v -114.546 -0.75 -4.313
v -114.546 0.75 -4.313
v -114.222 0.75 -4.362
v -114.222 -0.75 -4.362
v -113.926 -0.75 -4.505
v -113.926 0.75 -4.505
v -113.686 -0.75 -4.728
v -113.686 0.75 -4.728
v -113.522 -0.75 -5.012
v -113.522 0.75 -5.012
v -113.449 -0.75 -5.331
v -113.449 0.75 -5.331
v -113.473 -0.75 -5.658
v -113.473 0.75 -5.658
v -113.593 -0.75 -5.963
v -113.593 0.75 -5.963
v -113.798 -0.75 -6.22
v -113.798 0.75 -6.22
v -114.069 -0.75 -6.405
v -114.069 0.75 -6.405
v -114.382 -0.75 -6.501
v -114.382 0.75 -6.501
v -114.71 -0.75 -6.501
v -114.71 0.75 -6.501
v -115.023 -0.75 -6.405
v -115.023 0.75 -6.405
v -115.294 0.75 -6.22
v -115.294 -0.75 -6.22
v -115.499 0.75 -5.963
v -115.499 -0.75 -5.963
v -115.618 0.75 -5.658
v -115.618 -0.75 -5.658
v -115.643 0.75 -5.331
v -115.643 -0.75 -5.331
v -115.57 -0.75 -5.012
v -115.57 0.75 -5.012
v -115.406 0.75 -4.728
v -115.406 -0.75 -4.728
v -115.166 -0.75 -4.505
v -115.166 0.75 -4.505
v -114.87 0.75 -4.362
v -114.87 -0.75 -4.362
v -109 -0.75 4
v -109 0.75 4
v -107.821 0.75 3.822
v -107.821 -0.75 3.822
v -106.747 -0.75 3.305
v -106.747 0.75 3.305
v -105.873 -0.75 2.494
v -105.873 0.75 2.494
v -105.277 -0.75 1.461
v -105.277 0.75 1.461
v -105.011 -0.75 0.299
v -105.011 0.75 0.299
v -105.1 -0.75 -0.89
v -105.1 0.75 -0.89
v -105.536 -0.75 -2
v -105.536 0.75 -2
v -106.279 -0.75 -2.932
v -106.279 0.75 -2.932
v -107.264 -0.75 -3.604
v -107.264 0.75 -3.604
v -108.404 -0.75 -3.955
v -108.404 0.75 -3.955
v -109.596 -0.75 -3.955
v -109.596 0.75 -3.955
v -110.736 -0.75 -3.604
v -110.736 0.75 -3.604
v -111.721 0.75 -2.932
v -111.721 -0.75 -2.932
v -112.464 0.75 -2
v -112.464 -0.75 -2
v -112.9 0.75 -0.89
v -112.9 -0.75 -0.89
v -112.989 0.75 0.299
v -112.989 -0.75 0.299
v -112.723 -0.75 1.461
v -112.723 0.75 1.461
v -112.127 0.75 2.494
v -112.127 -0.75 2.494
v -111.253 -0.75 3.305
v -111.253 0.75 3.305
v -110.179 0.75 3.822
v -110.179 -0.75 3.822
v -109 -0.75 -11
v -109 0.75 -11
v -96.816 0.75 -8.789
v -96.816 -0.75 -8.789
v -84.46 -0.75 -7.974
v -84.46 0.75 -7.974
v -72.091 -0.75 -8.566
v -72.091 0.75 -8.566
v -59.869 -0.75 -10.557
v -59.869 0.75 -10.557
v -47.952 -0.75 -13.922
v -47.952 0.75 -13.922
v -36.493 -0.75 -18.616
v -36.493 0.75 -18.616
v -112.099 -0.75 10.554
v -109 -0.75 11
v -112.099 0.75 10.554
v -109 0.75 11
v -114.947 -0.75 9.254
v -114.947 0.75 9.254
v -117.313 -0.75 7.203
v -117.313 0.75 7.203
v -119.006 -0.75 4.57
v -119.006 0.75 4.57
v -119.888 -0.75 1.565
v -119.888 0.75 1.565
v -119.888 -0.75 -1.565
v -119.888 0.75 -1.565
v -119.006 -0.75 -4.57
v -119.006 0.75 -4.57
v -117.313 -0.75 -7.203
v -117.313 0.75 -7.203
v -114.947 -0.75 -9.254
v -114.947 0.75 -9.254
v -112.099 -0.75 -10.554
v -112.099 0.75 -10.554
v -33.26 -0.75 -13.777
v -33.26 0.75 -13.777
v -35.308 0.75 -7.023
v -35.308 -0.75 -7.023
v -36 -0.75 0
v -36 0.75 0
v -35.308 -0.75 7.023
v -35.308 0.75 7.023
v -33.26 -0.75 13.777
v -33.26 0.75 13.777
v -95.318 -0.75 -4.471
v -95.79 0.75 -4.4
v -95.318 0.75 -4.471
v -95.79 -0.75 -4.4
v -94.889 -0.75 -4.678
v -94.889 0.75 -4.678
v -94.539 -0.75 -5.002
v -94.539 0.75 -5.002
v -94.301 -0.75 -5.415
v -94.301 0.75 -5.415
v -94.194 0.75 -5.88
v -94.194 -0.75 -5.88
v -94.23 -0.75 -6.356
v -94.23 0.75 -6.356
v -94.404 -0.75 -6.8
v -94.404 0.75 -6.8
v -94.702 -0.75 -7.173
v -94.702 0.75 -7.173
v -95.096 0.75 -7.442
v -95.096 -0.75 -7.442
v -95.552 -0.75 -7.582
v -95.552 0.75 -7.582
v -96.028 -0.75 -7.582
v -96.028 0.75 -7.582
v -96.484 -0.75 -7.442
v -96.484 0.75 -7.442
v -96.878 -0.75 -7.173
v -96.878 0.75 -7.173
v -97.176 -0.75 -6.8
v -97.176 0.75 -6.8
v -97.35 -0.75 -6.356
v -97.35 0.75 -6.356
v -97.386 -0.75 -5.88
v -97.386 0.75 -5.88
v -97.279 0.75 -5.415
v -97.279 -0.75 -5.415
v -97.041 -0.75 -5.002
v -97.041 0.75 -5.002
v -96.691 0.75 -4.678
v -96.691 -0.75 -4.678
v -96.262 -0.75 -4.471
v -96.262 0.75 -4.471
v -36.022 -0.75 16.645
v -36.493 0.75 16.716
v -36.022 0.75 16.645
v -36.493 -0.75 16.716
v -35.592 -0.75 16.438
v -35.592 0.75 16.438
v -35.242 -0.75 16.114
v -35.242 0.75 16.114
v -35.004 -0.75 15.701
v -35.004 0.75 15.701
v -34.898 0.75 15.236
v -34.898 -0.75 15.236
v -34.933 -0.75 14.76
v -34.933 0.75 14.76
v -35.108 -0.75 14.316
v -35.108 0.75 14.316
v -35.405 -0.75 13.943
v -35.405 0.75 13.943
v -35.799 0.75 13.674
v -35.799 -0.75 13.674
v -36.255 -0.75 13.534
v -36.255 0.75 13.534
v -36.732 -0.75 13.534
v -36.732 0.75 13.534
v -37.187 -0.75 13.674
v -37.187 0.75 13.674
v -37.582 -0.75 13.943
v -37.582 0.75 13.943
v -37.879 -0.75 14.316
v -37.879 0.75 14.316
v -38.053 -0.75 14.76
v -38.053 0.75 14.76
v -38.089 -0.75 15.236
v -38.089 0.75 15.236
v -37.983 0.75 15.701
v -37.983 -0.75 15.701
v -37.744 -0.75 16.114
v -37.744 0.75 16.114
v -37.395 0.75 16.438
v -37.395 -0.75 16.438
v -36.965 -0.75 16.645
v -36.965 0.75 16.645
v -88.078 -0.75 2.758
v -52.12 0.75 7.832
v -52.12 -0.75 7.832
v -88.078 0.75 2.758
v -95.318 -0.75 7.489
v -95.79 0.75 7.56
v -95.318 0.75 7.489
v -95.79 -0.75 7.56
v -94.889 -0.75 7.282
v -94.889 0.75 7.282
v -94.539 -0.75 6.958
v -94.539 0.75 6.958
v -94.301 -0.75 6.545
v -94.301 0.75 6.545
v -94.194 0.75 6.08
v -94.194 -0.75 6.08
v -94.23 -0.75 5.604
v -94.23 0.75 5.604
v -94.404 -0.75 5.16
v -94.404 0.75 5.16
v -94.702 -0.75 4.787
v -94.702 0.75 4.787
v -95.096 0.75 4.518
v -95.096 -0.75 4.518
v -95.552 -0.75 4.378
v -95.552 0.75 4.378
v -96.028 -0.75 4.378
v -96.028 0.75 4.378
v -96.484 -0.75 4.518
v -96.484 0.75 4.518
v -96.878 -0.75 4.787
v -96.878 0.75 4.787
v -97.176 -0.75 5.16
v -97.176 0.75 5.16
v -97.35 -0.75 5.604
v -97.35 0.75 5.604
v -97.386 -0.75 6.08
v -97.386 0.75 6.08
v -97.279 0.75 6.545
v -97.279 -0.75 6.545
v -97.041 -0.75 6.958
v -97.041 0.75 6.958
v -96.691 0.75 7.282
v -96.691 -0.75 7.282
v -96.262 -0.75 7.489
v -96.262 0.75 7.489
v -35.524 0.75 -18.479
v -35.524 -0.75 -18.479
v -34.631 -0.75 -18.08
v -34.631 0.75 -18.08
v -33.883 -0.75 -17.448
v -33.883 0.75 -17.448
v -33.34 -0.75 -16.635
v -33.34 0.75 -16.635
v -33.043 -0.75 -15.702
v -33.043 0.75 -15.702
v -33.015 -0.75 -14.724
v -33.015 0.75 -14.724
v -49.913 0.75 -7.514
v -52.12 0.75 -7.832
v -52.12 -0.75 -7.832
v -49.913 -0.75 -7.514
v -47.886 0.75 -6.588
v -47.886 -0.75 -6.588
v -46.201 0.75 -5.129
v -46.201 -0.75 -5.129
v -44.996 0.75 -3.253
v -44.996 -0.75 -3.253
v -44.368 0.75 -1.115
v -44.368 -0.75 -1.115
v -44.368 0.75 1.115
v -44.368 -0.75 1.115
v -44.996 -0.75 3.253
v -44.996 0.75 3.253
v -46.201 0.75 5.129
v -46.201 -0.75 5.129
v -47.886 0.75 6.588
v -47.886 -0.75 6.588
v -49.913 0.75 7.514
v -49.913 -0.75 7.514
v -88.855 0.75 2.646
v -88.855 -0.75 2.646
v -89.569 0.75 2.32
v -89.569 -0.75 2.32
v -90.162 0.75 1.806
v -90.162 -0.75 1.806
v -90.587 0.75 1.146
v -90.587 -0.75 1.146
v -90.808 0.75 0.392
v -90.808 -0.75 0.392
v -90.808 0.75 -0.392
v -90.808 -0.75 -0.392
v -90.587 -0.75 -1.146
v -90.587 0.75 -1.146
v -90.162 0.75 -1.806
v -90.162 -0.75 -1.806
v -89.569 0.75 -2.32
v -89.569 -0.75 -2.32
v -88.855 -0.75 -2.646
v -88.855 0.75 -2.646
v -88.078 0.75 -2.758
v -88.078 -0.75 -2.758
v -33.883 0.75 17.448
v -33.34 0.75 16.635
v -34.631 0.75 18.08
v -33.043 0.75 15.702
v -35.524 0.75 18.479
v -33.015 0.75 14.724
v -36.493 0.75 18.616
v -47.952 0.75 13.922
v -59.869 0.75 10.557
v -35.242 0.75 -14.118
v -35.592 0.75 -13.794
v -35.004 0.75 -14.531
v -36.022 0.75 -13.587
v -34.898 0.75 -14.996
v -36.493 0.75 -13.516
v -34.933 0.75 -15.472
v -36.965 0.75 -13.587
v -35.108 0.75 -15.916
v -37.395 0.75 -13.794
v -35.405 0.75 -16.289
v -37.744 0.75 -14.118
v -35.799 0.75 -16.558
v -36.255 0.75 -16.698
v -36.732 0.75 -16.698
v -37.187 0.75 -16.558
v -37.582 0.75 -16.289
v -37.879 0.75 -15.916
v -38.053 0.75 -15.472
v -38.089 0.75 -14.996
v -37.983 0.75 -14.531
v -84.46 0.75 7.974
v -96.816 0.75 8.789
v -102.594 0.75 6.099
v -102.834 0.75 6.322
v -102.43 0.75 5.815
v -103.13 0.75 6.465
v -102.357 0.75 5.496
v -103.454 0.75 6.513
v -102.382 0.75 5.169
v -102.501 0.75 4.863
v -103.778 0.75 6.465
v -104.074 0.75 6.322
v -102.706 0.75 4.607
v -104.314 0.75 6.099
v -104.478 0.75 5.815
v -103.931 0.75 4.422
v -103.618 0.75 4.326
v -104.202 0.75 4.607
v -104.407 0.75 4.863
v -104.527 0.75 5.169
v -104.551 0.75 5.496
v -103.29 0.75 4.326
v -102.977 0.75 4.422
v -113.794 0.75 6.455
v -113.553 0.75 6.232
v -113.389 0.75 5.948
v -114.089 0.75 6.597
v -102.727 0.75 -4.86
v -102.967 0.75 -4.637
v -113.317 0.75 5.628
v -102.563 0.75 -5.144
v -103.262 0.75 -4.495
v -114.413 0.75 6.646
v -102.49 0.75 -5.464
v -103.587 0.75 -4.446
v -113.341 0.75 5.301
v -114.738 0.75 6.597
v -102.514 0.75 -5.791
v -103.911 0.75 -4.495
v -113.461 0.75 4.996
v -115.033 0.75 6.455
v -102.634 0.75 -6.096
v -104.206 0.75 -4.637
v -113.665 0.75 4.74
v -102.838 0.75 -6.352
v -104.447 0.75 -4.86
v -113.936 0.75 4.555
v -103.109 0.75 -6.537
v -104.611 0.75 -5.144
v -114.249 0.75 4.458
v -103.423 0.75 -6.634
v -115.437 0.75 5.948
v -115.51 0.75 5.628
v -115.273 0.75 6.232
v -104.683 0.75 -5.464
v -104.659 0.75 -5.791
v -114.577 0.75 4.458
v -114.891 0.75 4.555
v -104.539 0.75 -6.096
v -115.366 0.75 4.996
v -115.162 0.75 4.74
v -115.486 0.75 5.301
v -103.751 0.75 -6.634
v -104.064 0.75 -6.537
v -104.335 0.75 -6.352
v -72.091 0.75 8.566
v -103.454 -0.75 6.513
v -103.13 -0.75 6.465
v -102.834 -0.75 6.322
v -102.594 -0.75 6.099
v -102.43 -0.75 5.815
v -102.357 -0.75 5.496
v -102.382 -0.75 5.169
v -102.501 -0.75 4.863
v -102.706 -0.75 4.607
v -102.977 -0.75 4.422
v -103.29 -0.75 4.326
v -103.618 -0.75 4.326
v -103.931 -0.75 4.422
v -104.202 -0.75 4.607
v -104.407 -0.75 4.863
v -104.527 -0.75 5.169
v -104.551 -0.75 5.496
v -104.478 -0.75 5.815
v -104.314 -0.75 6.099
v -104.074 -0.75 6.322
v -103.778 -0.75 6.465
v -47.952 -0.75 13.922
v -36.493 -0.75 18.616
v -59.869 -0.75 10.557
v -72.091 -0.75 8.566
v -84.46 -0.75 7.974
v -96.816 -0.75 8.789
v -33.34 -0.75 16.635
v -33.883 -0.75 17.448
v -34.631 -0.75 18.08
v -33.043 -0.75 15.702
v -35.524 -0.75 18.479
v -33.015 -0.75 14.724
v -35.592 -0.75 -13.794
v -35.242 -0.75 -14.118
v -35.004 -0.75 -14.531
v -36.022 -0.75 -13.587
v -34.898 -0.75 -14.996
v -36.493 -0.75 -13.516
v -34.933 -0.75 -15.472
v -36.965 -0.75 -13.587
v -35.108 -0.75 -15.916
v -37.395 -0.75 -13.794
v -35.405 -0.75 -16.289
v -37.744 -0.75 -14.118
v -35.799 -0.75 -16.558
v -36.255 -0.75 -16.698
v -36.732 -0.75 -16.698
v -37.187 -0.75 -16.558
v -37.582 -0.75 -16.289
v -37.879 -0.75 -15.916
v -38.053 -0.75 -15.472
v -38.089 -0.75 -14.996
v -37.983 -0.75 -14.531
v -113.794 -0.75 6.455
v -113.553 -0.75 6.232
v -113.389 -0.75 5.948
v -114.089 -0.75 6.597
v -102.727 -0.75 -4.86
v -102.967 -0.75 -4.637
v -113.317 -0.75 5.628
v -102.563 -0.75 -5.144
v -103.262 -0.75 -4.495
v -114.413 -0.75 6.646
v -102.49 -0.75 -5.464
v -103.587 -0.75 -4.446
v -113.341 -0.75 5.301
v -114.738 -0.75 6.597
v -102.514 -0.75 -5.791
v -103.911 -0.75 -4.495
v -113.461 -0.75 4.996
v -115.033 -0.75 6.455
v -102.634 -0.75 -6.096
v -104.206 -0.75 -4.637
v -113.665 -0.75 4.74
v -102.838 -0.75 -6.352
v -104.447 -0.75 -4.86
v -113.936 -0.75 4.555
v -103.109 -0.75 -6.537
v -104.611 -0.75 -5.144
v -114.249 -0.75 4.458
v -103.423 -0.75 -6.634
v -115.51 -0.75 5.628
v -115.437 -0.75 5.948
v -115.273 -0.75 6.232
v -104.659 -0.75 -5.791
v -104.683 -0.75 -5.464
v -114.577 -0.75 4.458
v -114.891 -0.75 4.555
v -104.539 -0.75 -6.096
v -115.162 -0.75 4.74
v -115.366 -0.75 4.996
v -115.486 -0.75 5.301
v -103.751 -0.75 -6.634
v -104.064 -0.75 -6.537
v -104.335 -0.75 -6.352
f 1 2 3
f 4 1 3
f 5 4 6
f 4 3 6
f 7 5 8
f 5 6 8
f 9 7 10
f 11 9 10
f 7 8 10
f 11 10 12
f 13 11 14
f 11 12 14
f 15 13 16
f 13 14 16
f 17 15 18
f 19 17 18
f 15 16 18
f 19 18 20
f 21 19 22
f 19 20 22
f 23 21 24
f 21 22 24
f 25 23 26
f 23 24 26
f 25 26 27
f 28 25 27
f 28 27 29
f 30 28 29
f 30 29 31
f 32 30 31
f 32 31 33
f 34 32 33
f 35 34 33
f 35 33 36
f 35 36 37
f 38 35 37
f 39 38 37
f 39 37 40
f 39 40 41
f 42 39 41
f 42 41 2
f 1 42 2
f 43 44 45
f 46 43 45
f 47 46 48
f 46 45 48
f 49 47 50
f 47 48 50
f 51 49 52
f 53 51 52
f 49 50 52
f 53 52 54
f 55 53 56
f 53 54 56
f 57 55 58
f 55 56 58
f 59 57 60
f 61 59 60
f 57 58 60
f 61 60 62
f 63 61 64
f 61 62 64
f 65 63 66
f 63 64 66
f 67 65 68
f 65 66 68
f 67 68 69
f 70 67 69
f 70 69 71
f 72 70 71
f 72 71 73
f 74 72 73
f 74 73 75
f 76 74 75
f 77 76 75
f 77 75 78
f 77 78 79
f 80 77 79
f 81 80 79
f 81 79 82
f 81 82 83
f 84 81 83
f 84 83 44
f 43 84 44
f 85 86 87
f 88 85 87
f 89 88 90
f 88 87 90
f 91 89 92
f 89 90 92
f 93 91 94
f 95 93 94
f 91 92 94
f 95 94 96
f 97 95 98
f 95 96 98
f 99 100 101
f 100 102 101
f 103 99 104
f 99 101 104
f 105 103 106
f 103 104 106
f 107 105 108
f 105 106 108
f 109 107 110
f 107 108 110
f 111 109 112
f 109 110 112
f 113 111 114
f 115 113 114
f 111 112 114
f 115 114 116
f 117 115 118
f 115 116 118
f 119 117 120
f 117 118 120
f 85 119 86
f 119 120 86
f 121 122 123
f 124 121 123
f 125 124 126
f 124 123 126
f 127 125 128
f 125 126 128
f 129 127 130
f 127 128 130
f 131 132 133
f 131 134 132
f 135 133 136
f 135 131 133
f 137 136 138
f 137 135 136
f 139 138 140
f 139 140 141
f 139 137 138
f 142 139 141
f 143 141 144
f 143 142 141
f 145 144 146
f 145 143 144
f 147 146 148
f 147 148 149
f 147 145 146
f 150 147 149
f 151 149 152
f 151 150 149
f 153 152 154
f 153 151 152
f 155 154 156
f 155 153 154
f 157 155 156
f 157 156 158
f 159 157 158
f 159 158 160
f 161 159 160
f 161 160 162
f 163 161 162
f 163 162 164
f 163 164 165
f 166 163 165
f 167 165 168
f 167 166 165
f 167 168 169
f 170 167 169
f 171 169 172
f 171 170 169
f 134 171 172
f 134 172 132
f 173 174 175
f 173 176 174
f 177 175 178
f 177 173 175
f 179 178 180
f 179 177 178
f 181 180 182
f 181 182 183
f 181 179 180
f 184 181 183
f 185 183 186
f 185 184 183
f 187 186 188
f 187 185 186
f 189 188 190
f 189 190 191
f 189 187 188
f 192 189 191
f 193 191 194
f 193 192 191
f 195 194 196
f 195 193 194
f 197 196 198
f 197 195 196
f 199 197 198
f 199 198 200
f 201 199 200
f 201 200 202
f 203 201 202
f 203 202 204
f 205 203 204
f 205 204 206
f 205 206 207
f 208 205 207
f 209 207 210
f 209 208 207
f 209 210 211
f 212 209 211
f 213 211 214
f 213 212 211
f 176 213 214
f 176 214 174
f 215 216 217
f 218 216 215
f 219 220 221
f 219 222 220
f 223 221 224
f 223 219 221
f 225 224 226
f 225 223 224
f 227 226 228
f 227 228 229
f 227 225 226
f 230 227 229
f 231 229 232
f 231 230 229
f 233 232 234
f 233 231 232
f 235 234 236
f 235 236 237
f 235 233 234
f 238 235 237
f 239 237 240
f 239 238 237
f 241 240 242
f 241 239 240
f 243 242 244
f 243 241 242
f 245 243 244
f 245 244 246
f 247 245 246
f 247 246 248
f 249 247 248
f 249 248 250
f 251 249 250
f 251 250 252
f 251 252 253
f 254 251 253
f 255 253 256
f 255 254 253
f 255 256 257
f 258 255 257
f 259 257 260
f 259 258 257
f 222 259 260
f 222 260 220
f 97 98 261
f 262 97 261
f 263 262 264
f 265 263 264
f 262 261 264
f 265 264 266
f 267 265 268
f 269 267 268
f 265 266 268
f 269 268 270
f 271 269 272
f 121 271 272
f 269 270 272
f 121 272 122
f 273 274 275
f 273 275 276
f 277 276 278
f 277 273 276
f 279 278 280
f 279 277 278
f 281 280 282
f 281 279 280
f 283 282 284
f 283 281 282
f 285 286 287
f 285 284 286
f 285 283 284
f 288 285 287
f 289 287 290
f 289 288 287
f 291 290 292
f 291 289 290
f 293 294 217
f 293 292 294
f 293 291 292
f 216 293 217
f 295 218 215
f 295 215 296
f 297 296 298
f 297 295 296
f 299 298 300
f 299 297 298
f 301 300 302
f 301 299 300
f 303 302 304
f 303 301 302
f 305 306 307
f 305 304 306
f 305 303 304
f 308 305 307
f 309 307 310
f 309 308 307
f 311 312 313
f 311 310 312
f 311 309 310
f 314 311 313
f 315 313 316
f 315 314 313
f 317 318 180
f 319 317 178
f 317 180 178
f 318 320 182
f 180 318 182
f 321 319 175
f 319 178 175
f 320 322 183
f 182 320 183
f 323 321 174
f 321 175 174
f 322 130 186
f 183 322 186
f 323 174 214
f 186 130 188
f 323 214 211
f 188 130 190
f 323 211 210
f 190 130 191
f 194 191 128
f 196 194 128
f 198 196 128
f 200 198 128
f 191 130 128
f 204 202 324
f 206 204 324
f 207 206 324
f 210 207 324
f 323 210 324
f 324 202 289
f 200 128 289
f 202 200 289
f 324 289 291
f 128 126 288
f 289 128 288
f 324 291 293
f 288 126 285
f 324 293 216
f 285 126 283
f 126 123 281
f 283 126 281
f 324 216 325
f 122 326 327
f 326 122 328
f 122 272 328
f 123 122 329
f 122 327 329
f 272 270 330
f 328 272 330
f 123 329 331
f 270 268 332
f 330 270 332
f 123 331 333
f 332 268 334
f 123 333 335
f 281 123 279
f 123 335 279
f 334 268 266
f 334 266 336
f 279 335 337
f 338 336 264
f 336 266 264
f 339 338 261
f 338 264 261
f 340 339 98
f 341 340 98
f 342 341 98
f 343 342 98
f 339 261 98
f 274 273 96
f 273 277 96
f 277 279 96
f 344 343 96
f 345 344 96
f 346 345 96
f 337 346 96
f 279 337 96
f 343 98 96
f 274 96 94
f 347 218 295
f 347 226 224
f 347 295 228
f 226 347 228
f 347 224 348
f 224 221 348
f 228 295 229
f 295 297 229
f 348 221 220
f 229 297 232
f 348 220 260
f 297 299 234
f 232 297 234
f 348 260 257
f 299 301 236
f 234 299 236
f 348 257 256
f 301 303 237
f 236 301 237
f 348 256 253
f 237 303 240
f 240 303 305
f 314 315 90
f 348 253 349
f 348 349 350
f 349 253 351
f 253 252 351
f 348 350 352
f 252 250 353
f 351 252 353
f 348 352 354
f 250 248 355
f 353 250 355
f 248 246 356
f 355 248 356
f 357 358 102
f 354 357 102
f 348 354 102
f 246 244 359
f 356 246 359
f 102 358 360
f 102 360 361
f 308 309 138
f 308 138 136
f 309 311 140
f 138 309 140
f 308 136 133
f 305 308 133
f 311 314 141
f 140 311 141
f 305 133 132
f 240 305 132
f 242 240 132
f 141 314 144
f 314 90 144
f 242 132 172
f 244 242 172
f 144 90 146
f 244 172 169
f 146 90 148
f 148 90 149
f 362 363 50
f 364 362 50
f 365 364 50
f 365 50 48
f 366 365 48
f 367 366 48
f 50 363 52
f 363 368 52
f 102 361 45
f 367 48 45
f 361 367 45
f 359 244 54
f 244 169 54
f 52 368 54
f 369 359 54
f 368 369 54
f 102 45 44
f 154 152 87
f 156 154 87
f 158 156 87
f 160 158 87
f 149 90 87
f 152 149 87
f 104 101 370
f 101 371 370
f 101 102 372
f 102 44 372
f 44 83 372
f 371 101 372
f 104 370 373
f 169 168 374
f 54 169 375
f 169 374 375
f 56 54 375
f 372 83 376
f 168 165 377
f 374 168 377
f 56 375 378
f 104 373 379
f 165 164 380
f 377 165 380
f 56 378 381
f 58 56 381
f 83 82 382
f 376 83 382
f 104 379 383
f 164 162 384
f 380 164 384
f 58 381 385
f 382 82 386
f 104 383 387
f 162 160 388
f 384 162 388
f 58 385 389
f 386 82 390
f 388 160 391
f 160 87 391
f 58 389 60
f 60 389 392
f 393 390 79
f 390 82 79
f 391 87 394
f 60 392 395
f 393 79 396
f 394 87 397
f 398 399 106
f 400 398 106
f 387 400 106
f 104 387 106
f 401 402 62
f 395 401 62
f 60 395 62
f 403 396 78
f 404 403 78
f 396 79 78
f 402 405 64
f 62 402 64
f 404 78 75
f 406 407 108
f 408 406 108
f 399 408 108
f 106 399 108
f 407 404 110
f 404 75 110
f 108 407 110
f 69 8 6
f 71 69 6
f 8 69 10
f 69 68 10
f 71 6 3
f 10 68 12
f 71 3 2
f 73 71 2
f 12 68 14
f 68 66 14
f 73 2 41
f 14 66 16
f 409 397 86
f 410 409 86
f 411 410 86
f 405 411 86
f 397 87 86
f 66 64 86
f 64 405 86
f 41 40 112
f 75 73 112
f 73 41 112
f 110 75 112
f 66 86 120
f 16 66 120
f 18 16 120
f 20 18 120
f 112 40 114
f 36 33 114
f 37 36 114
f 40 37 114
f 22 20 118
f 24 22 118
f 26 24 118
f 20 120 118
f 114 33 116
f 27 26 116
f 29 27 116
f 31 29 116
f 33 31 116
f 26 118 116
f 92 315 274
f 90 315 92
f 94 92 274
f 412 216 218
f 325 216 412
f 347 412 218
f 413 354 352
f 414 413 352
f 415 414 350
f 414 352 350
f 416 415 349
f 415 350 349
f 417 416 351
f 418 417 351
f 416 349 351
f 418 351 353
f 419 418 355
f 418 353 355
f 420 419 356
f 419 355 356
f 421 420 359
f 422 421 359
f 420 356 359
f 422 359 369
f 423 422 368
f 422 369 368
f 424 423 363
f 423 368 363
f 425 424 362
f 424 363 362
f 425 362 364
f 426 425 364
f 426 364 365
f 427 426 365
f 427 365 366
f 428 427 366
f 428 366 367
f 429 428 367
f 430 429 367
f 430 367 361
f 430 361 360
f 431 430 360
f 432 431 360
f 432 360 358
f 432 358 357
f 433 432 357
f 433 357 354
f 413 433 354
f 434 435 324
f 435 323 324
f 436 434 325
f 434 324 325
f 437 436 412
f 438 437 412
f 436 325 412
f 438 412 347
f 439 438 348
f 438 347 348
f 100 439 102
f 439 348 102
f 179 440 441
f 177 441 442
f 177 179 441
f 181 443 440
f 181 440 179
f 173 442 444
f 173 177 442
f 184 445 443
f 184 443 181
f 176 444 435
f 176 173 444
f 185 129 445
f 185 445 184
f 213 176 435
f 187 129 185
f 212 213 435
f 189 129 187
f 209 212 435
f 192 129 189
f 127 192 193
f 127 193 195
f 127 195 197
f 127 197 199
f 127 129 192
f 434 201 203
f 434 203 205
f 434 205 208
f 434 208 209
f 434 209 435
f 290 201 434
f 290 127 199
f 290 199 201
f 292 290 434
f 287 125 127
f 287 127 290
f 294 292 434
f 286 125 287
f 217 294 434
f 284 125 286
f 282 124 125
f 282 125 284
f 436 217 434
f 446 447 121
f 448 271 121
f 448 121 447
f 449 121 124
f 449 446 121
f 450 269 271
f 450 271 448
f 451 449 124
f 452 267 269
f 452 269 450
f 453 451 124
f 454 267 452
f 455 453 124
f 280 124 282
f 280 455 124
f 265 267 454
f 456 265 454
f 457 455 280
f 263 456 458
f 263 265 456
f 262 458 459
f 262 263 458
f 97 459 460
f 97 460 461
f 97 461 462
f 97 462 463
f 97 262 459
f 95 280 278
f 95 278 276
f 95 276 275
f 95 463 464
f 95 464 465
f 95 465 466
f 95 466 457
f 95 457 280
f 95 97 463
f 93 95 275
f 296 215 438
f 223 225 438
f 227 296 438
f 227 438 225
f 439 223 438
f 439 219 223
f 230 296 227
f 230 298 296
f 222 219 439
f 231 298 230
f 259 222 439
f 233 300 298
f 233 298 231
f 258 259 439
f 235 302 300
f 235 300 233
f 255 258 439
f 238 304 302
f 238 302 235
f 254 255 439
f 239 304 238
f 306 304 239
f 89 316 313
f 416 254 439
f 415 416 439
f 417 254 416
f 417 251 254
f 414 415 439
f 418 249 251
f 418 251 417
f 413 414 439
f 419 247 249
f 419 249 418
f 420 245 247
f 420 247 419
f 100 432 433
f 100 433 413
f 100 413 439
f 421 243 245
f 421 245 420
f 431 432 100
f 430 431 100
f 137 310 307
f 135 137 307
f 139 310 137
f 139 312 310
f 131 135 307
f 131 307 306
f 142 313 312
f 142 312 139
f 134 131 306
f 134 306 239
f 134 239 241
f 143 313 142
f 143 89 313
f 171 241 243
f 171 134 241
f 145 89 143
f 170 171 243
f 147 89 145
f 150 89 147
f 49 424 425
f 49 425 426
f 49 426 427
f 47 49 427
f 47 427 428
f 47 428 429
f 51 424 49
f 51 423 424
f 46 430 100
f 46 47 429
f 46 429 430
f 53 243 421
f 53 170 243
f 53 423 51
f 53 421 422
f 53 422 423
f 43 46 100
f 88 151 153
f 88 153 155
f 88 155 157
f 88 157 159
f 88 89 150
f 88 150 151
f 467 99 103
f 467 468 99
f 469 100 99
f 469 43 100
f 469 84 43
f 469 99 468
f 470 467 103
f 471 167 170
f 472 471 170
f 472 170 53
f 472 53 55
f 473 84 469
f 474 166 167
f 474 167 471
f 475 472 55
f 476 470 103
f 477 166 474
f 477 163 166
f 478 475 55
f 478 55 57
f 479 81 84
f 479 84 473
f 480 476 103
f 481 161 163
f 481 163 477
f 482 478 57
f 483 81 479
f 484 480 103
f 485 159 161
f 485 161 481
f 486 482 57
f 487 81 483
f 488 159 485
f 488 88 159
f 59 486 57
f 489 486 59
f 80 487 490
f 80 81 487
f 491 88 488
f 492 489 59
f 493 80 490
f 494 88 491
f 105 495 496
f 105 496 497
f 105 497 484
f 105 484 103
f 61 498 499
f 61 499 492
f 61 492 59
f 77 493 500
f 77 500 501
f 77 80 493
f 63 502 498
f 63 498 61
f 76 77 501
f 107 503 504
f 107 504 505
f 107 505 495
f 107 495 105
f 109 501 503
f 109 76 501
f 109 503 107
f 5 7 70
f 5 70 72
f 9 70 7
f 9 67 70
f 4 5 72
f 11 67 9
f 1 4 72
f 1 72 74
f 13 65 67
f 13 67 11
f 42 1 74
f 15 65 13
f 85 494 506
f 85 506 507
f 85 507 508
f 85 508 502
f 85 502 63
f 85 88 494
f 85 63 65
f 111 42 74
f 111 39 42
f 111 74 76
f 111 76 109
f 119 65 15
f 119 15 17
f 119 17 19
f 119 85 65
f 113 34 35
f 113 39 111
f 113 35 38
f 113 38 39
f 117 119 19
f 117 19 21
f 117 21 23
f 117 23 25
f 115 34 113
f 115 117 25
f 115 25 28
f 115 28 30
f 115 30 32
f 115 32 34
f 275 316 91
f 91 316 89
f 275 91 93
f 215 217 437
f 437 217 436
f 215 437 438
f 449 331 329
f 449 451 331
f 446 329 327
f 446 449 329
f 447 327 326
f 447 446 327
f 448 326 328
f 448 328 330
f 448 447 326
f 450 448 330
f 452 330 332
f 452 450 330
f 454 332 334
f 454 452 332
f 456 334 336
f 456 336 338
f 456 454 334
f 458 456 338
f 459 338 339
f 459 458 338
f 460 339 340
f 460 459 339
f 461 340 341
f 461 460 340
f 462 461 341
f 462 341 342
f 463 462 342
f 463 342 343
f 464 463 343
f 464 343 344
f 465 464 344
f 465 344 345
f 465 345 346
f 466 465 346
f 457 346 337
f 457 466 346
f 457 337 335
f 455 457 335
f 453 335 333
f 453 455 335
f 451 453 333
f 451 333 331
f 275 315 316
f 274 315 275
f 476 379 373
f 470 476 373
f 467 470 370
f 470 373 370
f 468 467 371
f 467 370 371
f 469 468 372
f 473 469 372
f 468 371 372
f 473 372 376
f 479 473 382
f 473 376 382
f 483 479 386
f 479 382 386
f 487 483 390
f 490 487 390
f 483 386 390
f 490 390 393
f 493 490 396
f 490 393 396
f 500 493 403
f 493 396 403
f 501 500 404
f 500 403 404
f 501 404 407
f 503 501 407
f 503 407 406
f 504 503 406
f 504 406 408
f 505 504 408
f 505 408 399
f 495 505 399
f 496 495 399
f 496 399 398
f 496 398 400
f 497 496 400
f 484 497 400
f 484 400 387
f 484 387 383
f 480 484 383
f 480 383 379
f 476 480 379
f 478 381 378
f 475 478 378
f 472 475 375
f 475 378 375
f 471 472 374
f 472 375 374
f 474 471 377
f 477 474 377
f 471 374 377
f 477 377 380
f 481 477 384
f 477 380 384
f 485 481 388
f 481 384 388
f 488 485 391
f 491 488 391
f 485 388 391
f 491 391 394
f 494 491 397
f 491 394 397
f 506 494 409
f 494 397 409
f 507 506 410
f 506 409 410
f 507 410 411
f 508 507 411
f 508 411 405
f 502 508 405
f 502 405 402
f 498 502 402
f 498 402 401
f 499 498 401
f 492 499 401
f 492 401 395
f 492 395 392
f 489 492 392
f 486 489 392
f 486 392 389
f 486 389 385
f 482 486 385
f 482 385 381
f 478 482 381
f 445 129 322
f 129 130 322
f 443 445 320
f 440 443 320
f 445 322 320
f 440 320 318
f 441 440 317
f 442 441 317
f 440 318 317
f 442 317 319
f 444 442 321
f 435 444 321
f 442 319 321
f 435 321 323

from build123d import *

# Parameters (mm, degrees)
ESBO_O1_R                = 1.6
RESSALTO_EXTRUS_O1_DEPTH = 0.75
CORTE_EXTRUS_O1_REACH    = 123.445
ESBO_O2_R                = 4
ESBO_O2_R_2              = 1.1


with BuildPart() as part:
    # Esboço1 → Ressalto-extrusão1 (new, symmetric)
    with BuildSketch(Plane(origin=(0, 0, 0), x_dir=(1, 0, 0), z_dir=(0, 1, 0))):
        with BuildLine():
            ThreePointArc((-33.25966317, 13.776603565), (-36, 0), (-33.25966317, -13.776603565))
            ThreePointArc((-33.25966317, -13.776603565), (-33.583097891, -17.060491394), (-36.493241534, -18.615995578))
            ThreePointArc((-36.493241534, -18.615995578), (-72.090991916, -8.566197582), (-109, -11))
            ThreePointArc((-109, -11), (-120, 0), (-109, 11))
            ThreePointArc((-109, 11), (-72.090991916, 8.566197582), (-36.493241534, 18.615995578))
            ThreePointArc((-36.493241534, 18.615995578), (-33.583097891, 17.060491394), (-33.25966317, 13.776603565))
        make_face()
        with Locations(Location((-36.493241534, 15.115995578, 0), (0, 0, 270))):
            Circle(ESBO_O1_R, mode=Mode.SUBTRACT)
        with Locations(Location((-36.493241534, -15.115995578, 0), (0, 0, 270))):
            Circle(ESBO_O1_R, mode=Mode.SUBTRACT)
        with Locations(Location((-95.79, 6, 0), (0, 0, 270))):
            Circle(ESBO_O1_R, mode=Mode.SUBTRACT)
        with Locations(Location((-95.79, -5.96, 0), (0, 0, 270))):
            Circle(ESBO_O1_R, mode=Mode.SUBTRACT)
    extrude(amount=RESSALTO_EXTRUS_O1_DEPTH, both=True)

    # Esboço2 → Corte-extrusão1 (cut, up to next)
    with BuildSketch(Plane(origin=(0, 0.75, 0), x_dir=(1, 0, 0), z_dir=(0, 1, 0)), mode=Mode.PRIVATE) as corte_extrus_o1_sk1:
        with Locations(Location((-109, 0, 0), (0, 0, 270))):
            Circle(ESBO_O2_R)
    corte_extrus_o1_tool1 = extrude(corte_extrus_o1_sk1.sketch, amount=-CORTE_EXTRUS_O1_REACH, mode=Mode.PRIVATE) & part.part
    # Esboço2 → Corte-extrusão1 (cut, up to next)
    with BuildSketch(Plane(origin=(0, 0.75, 0), x_dir=(1, 0, 0), z_dir=(0, 1, 0)), mode=Mode.PRIVATE) as corte_extrus_o1_sk2:
        with Locations(Location((-103.586557067, 5.545911613, 0), (0, 0, 270))):
            Circle(ESBO_O2_R_2)
    corte_extrus_o1_tool2 = extrude(corte_extrus_o1_sk2.sketch, amount=-CORTE_EXTRUS_O1_REACH, mode=Mode.PRIVATE) & part.part
    # Esboço2 → Corte-extrusão1 (cut, up to next)
    with BuildSketch(Plane(origin=(0, 0.75, 0), x_dir=(1, 0, 0), z_dir=(0, 1, 0)), mode=Mode.PRIVATE) as corte_extrus_o1_sk3:
        with Locations(Location((-103.454088387, -5.413442933, 0), (0, 0, 270))):
            Circle(ESBO_O2_R_2)
    corte_extrus_o1_tool3 = extrude(corte_extrus_o1_sk3.sketch, amount=-CORTE_EXTRUS_O1_REACH, mode=Mode.PRIVATE) & part.part
    # Esboço2 → Corte-extrusão1 (cut, up to next)
    with BuildSketch(Plane(origin=(0, 0.75, 0), x_dir=(1, 0, 0), z_dir=(0, 1, 0)), mode=Mode.PRIVATE) as corte_extrus_o1_sk4:
        with Locations(Location((-114.413442933, -5.545911613, 0), (0, 0, 270))):
            Circle(ESBO_O2_R_2)
    corte_extrus_o1_tool4 = extrude(corte_extrus_o1_sk4.sketch, amount=-CORTE_EXTRUS_O1_REACH, mode=Mode.PRIVATE) & part.part
    # Esboço2 → Corte-extrusão1 (cut, up to next)
    with BuildSketch(Plane(origin=(0, 0.75, 0), x_dir=(1, 0, 0), z_dir=(0, 1, 0)), mode=Mode.PRIVATE) as corte_extrus_o1_sk5:
        with Locations(Location((-114.545911613, 5.413442933, 0), (0, 0, 270))):
            Circle(ESBO_O2_R_2)
    corte_extrus_o1_tool5 = extrude(corte_extrus_o1_sk5.sketch, amount=-CORTE_EXTRUS_O1_REACH, mode=Mode.PRIVATE) & part.part
    # Esboço2 → Corte-extrusão1 (cut, up to next)
    with BuildSketch(Plane(origin=(0, 0.75, 0), x_dir=(1, 0, 0), z_dir=(0, 1, 0)), mode=Mode.PRIVATE) as corte_extrus_o1_sk6:
        with BuildLine():
            Line((-88.078445949, 2.757577424), (-52.119636338, 7.831519885))
            ThreePointArc((-52.119636338, 7.831519885), (-44.288116453, 0), (-52.119636338, -7.831519885))
            Line((-52.119636338, -7.831519885), (-88.078445949, -2.757577424))
            ThreePointArc((-88.078445949, -2.757577424), (-90.836023373, 0), (-88.078445949, 2.757577424))
        make_face()
    corte_extrus_o1_tool6 = extrude(corte_extrus_o1_sk6.sketch, amount=-CORTE_EXTRUS_O1_REACH, mode=Mode.PRIVATE) & part.part
    add(corte_extrus_o1_tool1.solids().sort_by_distance((-109, 0.75, 0))[0], mode=Mode.SUBTRACT)
    add(corte_extrus_o1_tool2.solids().sort_by_distance((-103.586557, 0.75, -5.545912))[0], mode=Mode.SUBTRACT)
    add(corte_extrus_o1_tool3.solids().sort_by_distance((-103.454088, 0.75, 5.413443))[0], mode=Mode.SUBTRACT)
    add(corte_extrus_o1_tool4.solids().sort_by_distance((-114.413443, 0.75, 5.545912))[0], mode=Mode.SUBTRACT)
    add(corte_extrus_o1_tool5.solids().sort_by_distance((-114.545912, 0.75, -5.413443))[0], mode=Mode.SUBTRACT)
    add(corte_extrus_o1_tool6.solids().sort_by_distance((-64.134293, 0.75, 0))[0], mode=Mode.SUBTRACT)


solid = part.part
